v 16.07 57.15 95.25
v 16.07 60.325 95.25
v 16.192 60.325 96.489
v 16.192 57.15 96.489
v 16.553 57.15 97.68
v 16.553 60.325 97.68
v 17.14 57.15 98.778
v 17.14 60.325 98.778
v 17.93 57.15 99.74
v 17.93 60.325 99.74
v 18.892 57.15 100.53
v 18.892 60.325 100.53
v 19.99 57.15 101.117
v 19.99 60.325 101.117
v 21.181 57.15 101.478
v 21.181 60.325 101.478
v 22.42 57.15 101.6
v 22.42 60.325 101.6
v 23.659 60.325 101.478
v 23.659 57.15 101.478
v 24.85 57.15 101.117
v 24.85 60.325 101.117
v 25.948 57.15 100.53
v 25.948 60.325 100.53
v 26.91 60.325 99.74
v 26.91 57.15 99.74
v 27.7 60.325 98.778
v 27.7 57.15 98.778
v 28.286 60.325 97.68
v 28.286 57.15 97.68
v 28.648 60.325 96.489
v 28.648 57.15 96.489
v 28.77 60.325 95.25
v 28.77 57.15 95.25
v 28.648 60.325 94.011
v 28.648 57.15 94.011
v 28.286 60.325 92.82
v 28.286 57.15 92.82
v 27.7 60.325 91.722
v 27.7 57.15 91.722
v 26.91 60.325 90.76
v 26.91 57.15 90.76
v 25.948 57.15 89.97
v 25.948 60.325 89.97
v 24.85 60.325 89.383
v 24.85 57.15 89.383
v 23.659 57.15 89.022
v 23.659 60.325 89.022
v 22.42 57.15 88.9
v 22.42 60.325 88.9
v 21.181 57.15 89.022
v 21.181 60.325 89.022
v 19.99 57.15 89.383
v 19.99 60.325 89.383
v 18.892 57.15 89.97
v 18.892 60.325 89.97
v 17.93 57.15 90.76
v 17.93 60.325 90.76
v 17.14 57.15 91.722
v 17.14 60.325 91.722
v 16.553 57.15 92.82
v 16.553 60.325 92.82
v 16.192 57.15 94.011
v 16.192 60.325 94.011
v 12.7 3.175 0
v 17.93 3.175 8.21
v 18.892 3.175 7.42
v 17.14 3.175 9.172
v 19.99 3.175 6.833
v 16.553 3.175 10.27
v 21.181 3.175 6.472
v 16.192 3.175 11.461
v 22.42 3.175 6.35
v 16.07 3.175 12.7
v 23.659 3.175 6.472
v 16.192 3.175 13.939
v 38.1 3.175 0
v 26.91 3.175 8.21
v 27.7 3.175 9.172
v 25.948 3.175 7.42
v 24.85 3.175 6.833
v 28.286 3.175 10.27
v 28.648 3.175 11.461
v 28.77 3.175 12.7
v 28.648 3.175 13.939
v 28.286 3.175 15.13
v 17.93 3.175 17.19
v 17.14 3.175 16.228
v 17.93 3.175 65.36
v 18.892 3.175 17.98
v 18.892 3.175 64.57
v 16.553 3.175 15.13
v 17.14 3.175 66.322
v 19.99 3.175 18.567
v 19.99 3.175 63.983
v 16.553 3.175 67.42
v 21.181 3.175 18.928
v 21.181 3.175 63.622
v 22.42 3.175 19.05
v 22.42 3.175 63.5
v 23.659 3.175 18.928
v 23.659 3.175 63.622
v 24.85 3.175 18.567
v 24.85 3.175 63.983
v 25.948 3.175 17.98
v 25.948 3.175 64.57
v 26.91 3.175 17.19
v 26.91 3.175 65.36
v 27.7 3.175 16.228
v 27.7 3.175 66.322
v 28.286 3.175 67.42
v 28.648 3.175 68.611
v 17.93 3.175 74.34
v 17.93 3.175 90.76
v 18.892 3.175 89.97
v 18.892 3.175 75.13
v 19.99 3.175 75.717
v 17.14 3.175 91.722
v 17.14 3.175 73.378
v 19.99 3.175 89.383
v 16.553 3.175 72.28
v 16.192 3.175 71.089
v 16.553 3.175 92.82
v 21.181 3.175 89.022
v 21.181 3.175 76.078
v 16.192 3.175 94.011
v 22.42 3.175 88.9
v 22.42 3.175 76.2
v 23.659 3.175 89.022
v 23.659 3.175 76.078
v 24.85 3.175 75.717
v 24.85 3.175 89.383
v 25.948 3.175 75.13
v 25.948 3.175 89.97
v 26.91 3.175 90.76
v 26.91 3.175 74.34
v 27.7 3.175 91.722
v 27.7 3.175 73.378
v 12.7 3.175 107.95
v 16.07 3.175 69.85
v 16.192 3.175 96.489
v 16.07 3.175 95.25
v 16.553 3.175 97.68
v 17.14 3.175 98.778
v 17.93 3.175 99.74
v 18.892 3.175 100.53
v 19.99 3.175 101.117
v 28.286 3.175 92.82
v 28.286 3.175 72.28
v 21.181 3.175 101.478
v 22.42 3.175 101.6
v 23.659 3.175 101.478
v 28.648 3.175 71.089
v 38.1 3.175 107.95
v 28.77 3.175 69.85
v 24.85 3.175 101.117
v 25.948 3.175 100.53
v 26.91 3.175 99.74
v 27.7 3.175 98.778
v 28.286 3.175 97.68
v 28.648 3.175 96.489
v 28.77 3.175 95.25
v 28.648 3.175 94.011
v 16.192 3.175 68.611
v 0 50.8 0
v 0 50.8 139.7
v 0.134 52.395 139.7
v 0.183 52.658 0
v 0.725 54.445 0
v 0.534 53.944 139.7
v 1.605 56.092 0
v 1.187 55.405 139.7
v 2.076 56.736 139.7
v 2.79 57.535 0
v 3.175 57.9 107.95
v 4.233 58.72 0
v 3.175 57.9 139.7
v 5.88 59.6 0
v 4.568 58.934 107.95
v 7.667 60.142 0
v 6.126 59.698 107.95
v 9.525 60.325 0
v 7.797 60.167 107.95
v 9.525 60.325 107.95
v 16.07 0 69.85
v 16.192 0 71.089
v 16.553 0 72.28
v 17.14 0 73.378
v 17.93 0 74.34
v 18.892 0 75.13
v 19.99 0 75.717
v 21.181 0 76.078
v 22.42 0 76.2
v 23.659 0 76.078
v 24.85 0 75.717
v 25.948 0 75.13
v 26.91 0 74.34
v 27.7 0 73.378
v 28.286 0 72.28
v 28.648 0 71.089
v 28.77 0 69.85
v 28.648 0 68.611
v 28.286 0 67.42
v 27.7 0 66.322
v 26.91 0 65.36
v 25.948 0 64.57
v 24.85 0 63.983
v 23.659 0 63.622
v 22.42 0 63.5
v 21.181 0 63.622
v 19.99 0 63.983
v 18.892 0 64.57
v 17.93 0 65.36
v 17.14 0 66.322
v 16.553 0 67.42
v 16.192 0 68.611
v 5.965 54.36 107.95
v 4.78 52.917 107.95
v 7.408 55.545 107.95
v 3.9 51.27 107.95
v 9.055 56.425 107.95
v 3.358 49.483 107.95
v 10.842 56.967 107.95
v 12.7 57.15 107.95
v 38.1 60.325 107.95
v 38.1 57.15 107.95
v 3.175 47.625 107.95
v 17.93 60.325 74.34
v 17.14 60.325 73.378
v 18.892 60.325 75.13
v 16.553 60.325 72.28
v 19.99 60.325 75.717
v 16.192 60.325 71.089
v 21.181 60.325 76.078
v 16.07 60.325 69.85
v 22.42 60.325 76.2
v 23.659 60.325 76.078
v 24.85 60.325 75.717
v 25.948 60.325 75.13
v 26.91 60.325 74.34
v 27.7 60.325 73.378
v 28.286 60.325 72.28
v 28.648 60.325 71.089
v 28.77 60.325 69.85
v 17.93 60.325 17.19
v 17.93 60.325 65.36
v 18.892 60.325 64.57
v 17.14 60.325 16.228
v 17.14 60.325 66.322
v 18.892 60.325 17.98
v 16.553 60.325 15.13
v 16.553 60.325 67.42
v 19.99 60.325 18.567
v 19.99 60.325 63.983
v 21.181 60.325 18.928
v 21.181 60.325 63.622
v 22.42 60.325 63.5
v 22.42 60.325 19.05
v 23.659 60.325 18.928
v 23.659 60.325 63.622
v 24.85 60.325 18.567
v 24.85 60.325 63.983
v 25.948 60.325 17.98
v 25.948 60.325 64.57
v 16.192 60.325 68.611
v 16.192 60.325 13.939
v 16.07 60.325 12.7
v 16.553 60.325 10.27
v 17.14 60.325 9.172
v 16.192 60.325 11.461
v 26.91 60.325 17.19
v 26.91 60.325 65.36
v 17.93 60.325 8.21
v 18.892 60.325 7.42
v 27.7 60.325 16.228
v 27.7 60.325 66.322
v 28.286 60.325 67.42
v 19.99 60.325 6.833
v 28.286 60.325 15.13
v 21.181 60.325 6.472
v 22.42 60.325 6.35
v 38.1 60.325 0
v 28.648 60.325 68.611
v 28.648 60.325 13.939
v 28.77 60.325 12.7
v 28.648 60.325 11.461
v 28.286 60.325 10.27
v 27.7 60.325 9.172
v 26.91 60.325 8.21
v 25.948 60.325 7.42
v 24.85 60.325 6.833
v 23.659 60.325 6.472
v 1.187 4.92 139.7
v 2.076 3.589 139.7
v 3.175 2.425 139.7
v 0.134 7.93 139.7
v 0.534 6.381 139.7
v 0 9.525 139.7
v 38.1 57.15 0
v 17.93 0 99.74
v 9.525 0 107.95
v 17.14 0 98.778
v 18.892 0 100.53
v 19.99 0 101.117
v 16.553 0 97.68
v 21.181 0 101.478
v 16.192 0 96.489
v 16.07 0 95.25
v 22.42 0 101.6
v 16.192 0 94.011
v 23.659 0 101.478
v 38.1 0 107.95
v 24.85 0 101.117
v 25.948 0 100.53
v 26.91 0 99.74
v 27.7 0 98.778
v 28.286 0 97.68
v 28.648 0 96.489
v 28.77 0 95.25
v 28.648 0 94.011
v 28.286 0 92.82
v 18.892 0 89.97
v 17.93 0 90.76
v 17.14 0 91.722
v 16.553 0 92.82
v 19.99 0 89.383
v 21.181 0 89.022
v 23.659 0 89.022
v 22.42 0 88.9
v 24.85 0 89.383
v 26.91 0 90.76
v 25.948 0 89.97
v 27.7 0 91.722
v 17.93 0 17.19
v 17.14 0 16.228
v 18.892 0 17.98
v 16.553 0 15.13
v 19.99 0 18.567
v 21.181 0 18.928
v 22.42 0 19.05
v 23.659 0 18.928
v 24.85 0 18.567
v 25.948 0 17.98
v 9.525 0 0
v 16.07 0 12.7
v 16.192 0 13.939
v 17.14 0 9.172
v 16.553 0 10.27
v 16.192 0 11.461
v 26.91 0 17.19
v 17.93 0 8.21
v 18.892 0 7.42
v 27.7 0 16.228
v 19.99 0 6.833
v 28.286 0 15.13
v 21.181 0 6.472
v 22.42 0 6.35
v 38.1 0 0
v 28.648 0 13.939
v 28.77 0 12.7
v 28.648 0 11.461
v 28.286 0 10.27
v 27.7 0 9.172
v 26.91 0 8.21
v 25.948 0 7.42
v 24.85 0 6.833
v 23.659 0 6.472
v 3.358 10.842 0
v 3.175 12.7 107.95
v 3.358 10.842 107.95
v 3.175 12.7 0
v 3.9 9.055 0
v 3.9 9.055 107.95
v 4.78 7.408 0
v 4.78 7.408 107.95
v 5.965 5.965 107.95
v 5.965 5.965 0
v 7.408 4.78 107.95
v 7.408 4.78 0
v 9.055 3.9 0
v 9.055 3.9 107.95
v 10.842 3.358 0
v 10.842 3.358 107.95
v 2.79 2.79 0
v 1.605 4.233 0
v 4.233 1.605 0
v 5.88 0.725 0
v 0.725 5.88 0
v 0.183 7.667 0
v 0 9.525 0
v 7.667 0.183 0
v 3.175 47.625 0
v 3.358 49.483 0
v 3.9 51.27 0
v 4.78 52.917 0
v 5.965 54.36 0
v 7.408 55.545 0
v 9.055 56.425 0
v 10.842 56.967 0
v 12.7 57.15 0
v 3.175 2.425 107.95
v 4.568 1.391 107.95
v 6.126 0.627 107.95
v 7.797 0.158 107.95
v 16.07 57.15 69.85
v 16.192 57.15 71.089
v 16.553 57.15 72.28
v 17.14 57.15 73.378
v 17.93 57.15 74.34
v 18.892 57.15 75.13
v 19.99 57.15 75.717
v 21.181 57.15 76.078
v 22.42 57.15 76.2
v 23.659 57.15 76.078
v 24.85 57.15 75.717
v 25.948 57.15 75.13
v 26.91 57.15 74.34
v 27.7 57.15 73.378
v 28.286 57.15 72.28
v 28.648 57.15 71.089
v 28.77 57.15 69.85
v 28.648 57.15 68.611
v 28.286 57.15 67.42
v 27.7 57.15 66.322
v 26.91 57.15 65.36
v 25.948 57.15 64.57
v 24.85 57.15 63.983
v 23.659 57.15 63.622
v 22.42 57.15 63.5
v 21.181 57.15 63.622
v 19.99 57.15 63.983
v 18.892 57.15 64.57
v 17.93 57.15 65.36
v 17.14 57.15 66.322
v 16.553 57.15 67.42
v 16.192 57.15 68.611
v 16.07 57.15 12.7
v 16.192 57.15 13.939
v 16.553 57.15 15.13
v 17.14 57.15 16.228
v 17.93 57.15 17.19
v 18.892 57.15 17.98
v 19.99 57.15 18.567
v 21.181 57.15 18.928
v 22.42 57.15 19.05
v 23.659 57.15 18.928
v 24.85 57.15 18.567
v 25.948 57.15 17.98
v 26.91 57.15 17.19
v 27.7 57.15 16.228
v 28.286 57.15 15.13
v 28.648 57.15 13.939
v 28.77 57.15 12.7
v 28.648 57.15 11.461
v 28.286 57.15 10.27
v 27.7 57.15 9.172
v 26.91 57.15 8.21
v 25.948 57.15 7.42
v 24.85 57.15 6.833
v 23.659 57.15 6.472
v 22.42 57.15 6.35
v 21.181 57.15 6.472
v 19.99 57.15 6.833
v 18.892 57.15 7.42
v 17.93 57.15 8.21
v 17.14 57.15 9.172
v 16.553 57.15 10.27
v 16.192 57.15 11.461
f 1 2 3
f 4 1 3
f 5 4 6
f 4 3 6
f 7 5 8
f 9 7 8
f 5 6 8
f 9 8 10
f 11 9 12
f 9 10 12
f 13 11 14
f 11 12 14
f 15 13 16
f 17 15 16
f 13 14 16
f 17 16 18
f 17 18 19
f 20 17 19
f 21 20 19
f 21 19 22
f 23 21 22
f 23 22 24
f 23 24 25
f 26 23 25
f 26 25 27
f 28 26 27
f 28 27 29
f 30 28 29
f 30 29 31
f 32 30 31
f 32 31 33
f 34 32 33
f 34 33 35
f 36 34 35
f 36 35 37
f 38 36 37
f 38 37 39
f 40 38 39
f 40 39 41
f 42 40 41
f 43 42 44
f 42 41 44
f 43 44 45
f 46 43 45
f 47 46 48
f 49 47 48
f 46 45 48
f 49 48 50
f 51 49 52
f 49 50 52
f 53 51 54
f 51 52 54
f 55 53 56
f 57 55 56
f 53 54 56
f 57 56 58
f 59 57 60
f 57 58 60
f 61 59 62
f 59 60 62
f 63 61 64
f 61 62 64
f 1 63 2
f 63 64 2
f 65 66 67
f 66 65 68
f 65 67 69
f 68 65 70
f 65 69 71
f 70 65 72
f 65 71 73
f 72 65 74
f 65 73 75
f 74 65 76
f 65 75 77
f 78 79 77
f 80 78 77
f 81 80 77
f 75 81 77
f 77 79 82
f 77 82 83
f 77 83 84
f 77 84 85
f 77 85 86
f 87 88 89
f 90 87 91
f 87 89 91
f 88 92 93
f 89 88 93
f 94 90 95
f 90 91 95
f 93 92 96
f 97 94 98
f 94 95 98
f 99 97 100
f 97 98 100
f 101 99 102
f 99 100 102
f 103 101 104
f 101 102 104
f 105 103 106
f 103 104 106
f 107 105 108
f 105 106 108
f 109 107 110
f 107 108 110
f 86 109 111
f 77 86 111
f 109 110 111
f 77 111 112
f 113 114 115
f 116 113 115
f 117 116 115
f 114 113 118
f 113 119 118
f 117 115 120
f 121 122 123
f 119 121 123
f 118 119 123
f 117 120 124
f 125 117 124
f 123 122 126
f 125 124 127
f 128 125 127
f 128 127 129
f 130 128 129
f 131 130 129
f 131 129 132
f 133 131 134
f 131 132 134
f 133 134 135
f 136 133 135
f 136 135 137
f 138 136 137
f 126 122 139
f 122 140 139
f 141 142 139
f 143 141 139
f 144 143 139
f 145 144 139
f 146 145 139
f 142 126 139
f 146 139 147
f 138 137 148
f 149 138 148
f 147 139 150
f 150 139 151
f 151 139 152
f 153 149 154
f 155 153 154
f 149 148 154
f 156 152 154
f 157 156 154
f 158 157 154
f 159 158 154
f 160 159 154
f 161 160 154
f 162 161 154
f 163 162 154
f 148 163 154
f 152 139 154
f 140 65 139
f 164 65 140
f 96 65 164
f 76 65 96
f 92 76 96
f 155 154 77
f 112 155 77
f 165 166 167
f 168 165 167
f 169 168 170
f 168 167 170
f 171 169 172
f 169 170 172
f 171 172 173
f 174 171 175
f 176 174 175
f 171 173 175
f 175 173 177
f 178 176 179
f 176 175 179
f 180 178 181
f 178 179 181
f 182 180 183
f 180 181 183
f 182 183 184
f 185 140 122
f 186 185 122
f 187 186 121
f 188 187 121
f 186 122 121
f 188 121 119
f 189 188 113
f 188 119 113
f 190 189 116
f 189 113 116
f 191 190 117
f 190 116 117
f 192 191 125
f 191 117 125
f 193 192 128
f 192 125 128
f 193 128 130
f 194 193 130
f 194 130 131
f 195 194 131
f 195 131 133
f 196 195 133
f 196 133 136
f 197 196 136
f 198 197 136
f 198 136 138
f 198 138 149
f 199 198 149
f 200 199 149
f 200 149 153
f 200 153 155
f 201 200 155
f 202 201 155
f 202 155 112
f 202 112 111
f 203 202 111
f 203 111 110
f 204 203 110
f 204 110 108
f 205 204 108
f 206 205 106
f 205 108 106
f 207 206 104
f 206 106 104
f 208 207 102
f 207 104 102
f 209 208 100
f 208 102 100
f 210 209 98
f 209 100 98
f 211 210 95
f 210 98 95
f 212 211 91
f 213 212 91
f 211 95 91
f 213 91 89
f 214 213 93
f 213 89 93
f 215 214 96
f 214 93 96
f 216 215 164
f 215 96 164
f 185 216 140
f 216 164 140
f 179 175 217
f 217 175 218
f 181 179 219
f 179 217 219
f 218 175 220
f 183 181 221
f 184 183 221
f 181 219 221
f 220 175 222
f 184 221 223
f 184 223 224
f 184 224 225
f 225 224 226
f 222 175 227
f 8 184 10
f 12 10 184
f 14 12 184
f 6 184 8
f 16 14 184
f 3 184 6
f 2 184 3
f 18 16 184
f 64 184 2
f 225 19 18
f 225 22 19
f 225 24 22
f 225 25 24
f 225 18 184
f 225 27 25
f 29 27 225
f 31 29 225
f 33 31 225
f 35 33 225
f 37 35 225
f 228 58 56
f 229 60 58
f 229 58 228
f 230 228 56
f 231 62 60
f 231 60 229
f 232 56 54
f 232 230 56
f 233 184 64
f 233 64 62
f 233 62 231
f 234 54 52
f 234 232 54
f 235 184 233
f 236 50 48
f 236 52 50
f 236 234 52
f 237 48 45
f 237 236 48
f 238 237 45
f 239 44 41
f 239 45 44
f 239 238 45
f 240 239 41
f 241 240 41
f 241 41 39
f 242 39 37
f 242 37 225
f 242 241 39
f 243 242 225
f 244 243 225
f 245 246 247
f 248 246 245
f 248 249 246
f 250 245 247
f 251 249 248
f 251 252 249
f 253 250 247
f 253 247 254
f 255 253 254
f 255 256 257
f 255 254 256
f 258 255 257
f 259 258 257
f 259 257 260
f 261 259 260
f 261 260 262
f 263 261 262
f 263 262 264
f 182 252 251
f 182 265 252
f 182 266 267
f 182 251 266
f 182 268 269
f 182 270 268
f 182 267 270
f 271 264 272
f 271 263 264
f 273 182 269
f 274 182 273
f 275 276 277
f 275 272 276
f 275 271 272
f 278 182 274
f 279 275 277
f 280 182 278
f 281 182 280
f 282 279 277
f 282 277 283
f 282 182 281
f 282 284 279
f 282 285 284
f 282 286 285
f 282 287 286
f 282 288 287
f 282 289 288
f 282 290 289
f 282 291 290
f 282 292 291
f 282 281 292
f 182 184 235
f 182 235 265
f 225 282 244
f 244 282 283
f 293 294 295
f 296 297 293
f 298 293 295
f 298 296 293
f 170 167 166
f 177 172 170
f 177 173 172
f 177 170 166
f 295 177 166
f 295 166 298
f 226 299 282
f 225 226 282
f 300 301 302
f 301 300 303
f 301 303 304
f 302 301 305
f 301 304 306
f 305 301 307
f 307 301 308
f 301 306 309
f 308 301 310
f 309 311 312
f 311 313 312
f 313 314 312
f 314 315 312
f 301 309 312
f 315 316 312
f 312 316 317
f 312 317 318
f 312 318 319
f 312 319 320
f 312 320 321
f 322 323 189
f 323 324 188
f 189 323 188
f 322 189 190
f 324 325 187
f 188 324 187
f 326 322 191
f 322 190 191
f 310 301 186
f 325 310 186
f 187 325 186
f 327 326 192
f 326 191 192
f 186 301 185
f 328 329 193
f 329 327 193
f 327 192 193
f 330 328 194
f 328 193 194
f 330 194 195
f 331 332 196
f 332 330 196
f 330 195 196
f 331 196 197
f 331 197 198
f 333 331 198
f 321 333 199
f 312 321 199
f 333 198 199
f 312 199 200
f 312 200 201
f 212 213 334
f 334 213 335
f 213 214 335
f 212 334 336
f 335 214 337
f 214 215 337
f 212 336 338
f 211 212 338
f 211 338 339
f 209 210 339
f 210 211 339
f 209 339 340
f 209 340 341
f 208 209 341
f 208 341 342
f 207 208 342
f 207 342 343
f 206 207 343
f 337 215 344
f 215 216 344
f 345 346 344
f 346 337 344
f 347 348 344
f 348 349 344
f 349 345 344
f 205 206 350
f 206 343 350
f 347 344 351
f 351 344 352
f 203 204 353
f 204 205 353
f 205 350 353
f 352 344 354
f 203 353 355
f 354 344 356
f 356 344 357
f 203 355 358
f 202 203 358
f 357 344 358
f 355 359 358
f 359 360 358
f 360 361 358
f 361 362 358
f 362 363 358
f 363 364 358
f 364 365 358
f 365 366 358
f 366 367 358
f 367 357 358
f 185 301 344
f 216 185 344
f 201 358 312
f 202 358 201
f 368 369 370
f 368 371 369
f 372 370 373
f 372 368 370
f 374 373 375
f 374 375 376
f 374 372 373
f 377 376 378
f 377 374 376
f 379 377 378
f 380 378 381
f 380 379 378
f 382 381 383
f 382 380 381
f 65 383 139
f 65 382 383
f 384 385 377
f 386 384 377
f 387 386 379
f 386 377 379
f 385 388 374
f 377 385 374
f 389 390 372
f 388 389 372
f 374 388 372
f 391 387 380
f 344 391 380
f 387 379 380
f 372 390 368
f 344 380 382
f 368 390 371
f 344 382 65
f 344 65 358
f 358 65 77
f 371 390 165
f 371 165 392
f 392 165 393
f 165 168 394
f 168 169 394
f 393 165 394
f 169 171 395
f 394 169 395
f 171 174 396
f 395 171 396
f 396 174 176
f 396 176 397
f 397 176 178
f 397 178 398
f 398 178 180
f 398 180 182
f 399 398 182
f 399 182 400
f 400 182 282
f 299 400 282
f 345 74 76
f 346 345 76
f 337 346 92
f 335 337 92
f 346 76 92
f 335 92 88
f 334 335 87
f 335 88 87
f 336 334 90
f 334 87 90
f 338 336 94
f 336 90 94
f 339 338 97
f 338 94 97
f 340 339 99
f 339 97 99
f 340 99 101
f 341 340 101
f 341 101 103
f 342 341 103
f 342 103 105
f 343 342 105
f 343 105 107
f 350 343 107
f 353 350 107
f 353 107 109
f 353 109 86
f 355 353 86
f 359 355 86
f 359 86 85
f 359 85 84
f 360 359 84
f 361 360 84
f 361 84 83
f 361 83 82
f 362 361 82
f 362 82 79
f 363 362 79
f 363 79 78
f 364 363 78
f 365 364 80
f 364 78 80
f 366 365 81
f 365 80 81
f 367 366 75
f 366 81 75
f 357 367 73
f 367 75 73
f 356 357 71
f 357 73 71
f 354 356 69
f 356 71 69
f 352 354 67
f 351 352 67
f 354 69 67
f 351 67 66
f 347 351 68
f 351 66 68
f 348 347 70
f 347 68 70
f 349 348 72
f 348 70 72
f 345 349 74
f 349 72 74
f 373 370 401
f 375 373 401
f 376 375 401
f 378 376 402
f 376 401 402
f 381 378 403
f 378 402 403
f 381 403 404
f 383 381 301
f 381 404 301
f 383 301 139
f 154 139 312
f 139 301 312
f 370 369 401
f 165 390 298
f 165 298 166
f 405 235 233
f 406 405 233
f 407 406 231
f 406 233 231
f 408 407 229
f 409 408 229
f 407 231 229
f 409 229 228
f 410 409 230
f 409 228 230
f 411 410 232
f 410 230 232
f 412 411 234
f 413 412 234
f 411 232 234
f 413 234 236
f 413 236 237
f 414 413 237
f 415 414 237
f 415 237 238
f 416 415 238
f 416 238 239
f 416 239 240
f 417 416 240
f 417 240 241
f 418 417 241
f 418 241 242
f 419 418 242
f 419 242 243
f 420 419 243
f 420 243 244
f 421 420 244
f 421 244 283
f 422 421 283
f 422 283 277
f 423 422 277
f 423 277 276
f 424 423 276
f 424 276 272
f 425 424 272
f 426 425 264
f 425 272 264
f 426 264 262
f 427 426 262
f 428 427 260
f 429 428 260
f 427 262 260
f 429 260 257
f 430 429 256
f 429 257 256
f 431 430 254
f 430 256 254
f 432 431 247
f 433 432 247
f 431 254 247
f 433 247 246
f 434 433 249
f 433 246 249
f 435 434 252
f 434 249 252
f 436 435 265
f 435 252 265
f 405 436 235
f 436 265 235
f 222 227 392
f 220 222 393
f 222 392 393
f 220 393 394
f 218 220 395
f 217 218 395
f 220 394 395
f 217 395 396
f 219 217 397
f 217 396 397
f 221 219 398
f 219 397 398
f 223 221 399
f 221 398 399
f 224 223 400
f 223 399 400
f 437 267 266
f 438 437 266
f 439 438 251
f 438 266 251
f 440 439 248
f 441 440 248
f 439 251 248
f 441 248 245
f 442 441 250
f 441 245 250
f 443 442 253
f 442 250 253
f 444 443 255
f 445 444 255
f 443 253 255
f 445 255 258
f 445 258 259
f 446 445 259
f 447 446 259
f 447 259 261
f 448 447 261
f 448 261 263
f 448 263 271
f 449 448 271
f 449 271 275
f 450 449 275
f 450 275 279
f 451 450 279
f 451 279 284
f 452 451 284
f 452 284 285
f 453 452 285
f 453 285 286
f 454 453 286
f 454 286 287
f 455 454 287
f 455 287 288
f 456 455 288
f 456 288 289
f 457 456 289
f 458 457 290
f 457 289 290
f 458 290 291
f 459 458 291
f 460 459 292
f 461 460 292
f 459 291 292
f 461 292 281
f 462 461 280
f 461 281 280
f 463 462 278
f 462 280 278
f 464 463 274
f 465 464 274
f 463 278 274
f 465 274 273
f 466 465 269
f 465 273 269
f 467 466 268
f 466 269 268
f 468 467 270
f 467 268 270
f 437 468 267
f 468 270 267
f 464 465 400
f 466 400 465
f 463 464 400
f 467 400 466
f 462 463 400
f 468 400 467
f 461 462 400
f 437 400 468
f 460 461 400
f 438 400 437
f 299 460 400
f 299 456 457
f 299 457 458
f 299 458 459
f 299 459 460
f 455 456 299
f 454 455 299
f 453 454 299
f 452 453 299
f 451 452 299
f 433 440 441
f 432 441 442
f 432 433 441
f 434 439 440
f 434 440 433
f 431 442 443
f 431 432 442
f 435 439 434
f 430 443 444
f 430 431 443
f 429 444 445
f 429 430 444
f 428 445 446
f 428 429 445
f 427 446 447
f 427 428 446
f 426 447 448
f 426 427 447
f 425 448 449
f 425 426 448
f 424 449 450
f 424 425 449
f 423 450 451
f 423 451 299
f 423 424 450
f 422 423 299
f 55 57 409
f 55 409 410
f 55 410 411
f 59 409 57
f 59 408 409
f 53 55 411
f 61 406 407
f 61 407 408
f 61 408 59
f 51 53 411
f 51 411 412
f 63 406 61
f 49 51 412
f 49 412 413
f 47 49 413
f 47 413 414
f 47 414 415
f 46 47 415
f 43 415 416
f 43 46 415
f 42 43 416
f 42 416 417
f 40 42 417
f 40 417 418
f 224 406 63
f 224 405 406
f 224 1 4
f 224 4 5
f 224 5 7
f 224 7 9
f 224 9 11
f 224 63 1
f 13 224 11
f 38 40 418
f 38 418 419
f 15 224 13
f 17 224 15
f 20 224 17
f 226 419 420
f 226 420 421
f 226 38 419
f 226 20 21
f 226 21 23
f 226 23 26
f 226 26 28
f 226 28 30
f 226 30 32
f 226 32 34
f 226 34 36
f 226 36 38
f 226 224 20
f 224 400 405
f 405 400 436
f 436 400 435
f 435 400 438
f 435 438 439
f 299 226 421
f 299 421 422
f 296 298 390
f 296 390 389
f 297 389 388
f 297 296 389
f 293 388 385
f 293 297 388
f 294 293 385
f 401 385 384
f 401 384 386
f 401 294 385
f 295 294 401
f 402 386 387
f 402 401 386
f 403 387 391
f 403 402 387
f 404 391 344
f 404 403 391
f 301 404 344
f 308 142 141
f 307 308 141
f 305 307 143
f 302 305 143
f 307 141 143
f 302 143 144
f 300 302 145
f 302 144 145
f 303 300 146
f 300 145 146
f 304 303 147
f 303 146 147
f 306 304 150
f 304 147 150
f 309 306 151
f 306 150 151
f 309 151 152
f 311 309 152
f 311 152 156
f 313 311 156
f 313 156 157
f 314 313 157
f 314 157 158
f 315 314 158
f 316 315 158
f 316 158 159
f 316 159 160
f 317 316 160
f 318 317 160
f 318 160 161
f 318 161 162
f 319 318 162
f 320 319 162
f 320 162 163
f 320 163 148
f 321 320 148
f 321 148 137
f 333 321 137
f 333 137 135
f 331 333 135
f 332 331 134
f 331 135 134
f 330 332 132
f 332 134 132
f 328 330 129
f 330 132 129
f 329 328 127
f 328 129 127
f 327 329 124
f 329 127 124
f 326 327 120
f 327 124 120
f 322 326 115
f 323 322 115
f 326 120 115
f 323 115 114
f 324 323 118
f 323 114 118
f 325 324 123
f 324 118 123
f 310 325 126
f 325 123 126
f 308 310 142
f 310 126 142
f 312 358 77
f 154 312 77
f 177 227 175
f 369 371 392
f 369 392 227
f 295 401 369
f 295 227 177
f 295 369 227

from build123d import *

# Parameters (mm, degrees)
F0_W      = 38.1
F0_H      = 60.325
F1_DEPTH  = 139.7
F2_W      = 34.925
F2_H      = 53.975
F3_DEPTH  = 762
F4_W      = 34.925
F4_H      = 31.75
F5_DEPTH  = 85.344
F6_R      = 9.525
F8_D      = 12.7
F8_DEPTH  = 127
F10_D     = 12.7
F10_DEPTH = 127


with BuildPart() as f1:
    # F0 (on Top) → F1 (new body)
    with BuildSketch(Plane.XY):
        with Locations((19.05, 30.1625)):
            Rectangle(F0_W, F0_H)
    extrude(amount=F1_DEPTH)

    # F2 (on face) → F3 (cut)
    with BuildSketch(Plane.XY.offset(139.7)):
        with Locations((20.6375, 30.1625)):
            Rectangle(F2_W, F2_H)
    extrude(amount=-F3_DEPTH, mode=Mode.SUBTRACT)

    # F4 (on face) → F5 (cut)
    with BuildSketch(Plane.XZ):
        with Locations((20.6375, 123.825)):
            Rectangle(F4_W, F4_H)
    extrude(amount=-F5_DEPTH, mode=Mode.SUBTRACT)

    # F6
    f6_edges = [f1.edges().sort_by_distance(p)[0] for p in [
        (3.175, 57.15, 53.975),
        (3.175, 3.175, 53.975),
        (0, 0, 69.85),
        (0, 60.325, 69.85),
    ]]
    fillet(f6_edges, radius=F6_R)

    # F8
    with Locations(Plane.XZ):
        with Locations((22.419682, 95.25), (22.419682, 12.7)):
            Hole(F8_D / 2, depth=F8_DEPTH)

    # F10
    with Locations(Plane.XZ):
        with Locations((22.419682, 69.85)):
            Hole(F10_D / 2, depth=F10_DEPTH)


solid = f1.part
